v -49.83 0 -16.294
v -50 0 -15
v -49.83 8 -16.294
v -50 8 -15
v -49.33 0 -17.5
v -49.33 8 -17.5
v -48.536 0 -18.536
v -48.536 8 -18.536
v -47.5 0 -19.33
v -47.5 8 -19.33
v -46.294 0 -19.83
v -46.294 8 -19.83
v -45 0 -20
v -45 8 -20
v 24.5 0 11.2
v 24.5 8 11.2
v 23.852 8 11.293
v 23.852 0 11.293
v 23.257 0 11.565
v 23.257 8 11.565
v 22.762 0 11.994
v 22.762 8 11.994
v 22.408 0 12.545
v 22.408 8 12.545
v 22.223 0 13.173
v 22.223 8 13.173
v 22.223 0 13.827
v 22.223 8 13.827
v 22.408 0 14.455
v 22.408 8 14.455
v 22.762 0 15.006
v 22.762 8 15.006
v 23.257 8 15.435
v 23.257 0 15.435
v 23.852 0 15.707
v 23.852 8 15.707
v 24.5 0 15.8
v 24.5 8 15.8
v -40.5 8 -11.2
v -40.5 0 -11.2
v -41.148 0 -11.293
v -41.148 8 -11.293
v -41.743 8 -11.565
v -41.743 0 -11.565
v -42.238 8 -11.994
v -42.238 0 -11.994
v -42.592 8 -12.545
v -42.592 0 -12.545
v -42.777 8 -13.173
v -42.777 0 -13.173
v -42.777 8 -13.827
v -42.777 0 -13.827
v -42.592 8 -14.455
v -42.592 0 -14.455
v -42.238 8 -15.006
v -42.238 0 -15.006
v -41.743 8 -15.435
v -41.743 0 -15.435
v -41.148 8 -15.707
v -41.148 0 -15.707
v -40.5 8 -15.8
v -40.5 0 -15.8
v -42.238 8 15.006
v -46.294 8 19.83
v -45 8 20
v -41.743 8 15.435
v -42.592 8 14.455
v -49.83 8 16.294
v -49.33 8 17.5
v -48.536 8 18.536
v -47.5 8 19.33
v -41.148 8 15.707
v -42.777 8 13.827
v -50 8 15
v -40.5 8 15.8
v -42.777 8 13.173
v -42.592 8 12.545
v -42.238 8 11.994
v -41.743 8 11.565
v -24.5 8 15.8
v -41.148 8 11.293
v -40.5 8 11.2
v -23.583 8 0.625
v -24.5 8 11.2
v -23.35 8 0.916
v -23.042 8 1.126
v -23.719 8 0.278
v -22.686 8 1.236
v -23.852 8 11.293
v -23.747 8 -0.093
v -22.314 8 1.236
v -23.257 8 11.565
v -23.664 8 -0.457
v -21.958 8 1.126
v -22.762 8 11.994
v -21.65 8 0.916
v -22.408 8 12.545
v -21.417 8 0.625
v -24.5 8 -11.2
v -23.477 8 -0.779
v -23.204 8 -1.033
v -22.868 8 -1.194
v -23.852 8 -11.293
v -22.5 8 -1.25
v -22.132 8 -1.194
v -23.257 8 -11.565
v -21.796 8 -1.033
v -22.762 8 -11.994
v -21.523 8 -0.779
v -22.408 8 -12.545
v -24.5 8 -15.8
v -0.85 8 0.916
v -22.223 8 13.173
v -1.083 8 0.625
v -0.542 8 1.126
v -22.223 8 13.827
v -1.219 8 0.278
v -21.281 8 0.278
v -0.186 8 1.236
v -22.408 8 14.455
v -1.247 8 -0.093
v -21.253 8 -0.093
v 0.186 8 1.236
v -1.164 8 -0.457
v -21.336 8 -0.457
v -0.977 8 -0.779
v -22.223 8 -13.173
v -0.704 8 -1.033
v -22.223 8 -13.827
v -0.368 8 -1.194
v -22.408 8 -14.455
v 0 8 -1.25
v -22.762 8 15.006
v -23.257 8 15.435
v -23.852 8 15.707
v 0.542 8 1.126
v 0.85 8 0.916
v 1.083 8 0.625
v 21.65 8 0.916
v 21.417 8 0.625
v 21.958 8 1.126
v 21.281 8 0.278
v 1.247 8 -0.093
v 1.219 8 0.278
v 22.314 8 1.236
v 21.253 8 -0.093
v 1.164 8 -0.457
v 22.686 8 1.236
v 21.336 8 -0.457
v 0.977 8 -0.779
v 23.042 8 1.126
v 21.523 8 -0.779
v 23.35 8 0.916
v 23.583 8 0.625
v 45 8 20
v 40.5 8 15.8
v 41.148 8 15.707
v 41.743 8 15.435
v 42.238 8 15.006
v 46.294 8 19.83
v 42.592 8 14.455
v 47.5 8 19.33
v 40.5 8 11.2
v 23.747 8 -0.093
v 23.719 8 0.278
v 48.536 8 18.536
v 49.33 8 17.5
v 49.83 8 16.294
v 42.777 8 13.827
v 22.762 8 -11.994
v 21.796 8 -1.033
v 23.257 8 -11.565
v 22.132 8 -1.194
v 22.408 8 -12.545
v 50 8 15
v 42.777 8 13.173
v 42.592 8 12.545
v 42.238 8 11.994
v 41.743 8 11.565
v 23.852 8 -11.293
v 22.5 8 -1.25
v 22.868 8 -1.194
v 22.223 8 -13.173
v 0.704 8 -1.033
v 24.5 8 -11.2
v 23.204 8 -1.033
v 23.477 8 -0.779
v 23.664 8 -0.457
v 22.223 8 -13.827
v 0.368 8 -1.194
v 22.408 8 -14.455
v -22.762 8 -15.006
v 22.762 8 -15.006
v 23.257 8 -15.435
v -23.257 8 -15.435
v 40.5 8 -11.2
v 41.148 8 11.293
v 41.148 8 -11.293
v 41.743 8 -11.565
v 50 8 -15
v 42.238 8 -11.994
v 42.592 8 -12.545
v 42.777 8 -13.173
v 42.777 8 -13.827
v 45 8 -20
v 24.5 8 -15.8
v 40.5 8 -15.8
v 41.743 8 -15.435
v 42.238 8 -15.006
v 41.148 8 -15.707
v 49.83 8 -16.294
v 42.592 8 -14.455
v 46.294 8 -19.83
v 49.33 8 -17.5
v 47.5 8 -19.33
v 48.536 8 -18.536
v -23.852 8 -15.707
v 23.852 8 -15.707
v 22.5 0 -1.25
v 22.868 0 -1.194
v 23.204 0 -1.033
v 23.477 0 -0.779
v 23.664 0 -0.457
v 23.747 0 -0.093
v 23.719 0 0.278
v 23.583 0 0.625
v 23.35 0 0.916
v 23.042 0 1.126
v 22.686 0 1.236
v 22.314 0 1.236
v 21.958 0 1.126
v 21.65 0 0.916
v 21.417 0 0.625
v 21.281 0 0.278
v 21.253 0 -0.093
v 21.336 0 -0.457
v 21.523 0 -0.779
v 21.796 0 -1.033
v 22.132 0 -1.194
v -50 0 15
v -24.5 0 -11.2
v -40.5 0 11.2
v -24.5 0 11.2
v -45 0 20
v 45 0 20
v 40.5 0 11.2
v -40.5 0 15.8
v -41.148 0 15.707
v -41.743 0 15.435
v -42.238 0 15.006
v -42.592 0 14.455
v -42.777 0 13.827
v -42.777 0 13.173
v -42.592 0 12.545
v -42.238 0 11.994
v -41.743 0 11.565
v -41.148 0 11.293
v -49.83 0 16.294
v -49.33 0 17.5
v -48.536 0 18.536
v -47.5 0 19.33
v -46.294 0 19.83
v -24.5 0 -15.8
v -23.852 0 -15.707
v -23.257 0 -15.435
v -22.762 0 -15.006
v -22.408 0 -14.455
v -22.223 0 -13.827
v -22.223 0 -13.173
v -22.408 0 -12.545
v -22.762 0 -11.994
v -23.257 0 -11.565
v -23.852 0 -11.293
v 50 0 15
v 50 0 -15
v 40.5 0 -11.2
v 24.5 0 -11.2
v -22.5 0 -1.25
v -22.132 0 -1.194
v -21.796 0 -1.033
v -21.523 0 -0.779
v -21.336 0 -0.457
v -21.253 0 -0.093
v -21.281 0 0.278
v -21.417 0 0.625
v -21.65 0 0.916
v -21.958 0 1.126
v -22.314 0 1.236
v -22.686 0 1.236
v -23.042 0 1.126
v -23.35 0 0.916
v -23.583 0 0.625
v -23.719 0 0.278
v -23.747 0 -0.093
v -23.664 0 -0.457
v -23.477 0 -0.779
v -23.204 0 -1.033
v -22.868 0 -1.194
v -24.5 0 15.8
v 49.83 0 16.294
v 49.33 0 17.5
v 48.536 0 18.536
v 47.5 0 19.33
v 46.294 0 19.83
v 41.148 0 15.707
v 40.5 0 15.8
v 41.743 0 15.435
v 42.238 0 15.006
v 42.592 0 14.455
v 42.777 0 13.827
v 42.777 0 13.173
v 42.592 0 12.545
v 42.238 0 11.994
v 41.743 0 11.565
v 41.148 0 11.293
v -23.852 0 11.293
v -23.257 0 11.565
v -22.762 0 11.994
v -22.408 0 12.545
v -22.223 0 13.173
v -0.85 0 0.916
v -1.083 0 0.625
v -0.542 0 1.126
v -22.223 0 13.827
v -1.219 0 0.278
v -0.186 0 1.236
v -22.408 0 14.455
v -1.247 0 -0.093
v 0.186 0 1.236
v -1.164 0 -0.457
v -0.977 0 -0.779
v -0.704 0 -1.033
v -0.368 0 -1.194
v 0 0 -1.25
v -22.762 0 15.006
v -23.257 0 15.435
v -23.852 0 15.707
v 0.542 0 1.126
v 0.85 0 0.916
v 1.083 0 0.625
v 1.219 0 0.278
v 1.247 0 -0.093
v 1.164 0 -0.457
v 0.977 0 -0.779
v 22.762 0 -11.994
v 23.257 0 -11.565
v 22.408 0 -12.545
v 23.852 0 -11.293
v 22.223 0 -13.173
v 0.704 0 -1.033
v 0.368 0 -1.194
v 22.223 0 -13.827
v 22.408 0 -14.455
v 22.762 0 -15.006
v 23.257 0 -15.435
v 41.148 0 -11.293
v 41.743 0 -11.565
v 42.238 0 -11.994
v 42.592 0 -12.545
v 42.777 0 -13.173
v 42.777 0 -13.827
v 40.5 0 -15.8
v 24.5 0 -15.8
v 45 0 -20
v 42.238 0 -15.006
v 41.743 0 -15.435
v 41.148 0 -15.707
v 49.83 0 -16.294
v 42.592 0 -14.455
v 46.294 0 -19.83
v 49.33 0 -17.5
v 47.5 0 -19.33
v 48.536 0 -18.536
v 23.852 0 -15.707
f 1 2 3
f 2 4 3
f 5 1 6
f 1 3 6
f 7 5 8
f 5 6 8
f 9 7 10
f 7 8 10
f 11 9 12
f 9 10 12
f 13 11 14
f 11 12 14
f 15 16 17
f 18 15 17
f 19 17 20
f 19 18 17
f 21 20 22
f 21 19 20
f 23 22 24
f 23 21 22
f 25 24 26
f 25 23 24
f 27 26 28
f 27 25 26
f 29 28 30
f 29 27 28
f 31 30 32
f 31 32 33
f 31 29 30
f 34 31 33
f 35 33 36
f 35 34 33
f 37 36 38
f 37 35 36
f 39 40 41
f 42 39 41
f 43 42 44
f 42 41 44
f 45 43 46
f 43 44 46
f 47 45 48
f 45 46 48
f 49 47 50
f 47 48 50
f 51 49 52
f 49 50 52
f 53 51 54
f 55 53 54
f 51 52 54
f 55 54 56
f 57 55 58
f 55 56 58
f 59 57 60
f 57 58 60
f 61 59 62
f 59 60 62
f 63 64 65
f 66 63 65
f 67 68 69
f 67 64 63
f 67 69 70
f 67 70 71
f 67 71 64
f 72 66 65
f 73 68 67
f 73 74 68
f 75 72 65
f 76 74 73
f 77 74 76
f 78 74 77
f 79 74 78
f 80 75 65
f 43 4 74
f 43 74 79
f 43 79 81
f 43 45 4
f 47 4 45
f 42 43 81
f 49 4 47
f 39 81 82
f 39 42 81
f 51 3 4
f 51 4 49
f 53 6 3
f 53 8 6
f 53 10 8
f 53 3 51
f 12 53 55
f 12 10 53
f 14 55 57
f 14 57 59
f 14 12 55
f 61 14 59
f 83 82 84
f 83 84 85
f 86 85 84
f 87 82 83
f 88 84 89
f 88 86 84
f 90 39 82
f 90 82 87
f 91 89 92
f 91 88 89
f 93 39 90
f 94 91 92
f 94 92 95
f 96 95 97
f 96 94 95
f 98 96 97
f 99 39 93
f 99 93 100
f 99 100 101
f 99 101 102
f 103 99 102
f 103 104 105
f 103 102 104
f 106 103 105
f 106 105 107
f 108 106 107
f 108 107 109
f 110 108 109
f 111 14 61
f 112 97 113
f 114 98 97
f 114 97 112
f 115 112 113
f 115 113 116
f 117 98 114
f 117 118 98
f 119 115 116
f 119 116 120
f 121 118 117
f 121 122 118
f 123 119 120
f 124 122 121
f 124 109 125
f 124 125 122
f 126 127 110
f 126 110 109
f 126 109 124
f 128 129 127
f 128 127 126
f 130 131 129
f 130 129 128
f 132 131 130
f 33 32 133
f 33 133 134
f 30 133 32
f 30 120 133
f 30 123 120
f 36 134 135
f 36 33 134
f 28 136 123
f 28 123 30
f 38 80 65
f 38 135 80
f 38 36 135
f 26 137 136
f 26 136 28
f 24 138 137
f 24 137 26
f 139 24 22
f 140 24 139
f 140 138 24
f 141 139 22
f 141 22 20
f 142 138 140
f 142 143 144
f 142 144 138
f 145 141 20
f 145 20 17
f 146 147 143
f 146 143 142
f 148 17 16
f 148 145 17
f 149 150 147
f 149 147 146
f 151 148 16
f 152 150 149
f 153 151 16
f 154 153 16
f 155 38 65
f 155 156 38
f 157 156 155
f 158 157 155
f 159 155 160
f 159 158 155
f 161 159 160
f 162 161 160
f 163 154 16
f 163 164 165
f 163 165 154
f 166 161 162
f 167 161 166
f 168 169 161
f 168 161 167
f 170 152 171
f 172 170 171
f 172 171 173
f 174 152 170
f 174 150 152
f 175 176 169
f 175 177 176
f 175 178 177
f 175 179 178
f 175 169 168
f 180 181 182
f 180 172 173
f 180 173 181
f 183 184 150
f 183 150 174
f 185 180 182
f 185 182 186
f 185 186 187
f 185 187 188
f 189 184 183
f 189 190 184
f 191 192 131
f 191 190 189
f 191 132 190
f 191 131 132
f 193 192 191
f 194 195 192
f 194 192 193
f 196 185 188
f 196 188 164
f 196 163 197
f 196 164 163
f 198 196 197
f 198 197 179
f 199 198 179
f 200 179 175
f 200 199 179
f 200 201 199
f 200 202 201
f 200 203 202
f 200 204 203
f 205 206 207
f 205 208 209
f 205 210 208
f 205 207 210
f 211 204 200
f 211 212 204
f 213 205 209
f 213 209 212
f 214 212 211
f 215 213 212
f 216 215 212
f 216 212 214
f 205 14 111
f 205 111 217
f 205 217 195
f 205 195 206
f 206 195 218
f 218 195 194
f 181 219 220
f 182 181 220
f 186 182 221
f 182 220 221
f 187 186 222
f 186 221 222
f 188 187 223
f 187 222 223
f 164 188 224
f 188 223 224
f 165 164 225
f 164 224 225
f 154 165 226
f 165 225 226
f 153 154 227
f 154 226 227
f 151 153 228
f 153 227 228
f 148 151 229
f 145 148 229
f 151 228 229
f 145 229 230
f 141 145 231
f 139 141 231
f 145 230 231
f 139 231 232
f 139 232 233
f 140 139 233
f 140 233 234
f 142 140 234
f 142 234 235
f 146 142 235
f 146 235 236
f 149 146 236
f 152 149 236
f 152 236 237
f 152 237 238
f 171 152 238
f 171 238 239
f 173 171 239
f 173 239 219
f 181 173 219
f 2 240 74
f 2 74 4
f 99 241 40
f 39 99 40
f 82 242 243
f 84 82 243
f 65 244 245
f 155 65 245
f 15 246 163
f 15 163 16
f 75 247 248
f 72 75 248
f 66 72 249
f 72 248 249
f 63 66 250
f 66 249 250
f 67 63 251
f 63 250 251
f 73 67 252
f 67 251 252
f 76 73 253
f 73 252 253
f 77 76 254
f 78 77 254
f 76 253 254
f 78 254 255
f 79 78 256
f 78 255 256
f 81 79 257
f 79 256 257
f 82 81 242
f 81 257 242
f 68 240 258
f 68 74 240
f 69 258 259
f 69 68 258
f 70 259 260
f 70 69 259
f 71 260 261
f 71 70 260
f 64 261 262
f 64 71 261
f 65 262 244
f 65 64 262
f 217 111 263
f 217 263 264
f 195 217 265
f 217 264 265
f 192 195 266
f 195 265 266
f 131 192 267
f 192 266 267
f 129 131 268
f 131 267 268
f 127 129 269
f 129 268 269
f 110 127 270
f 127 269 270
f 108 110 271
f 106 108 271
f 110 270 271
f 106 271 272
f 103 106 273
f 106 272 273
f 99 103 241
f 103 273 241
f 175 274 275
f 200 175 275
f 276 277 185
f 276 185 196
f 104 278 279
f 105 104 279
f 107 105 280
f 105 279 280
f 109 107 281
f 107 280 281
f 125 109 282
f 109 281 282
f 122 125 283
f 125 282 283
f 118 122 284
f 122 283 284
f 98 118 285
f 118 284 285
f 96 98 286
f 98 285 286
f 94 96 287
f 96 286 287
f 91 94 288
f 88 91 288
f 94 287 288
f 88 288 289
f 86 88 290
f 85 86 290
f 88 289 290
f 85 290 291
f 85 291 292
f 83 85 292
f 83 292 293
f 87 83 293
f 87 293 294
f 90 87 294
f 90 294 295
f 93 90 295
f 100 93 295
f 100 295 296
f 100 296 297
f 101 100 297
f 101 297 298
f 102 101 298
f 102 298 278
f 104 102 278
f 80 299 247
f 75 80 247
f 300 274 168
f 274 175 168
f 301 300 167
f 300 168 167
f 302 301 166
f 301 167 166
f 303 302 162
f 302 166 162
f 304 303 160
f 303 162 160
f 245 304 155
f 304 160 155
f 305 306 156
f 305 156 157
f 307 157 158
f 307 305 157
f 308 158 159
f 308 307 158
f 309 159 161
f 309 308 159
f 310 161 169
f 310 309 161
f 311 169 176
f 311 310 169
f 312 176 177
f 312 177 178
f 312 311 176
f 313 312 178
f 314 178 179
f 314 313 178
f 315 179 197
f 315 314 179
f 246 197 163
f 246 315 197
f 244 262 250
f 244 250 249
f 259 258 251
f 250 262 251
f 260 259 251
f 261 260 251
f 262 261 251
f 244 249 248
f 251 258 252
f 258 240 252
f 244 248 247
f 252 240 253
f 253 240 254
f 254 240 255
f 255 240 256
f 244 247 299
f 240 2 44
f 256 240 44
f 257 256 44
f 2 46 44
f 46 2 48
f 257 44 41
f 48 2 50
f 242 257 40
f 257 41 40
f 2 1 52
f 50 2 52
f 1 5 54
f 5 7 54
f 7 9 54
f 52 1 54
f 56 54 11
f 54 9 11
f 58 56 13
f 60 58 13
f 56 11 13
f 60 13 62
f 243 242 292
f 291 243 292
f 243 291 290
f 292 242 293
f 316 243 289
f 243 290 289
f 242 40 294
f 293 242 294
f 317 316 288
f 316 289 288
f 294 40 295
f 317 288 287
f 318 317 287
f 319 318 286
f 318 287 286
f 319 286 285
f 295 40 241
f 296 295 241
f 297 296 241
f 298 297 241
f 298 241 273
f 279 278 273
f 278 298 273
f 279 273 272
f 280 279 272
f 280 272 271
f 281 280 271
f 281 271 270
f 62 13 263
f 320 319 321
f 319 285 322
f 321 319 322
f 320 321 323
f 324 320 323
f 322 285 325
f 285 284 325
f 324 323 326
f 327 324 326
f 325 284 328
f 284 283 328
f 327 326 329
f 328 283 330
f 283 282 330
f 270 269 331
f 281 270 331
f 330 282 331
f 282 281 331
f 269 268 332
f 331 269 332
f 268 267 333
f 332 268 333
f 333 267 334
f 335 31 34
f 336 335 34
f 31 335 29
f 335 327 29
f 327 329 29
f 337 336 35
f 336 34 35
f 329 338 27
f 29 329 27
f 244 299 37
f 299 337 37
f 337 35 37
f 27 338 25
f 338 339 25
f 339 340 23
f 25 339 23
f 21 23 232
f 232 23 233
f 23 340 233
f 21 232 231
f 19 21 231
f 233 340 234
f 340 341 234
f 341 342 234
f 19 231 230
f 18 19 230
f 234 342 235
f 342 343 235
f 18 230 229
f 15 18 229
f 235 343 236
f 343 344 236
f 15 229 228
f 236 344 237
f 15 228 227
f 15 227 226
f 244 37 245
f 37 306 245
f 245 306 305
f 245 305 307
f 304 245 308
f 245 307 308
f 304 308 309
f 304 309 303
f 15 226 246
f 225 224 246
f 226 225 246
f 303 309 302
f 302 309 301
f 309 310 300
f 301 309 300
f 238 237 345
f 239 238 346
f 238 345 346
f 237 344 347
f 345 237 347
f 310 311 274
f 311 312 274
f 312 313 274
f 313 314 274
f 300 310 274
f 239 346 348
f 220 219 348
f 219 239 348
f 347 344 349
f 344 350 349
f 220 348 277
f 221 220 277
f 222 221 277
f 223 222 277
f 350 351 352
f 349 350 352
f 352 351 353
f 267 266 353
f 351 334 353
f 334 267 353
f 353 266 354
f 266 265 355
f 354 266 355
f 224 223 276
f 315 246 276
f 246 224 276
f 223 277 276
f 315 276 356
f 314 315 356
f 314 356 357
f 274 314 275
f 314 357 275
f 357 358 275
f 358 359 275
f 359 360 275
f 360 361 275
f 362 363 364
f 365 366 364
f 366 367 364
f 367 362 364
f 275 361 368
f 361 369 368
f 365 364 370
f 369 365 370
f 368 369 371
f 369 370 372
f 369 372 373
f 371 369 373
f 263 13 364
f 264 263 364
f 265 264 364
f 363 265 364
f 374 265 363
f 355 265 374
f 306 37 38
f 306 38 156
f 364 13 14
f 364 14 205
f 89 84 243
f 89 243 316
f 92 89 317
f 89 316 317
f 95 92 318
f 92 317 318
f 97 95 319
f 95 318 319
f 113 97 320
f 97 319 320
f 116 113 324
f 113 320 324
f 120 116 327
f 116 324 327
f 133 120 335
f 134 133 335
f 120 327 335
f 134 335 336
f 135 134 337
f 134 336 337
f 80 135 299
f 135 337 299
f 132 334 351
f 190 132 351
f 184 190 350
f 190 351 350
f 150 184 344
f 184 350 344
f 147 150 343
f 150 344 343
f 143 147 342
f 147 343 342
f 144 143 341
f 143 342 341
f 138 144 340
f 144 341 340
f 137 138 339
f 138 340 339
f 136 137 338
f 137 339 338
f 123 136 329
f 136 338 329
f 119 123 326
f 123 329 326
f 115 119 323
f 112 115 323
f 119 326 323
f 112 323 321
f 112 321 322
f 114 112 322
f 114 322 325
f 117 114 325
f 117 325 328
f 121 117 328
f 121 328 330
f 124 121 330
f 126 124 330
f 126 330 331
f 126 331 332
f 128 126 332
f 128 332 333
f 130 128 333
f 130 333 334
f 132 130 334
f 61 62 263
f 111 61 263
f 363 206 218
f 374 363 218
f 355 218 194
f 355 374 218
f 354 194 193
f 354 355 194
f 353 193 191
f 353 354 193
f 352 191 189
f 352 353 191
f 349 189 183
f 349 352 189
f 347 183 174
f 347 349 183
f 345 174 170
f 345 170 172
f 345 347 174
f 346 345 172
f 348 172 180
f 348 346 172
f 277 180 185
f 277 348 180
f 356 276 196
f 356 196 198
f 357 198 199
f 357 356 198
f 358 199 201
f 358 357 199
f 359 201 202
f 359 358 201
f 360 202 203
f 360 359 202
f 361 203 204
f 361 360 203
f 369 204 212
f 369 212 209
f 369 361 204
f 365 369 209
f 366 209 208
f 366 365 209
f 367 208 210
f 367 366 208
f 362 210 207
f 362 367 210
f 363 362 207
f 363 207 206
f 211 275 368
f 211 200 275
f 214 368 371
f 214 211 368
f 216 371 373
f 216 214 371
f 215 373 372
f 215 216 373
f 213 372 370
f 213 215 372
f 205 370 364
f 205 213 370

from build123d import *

# Parameters (mm, degrees)
SKETCH_1_W                       = 100
SKETCH_1_H                       = 40
EXTRUDE_1_DEPTH                  = 8
HOLE_WIZARD_M3_2_D               = 2.5
HOLE_WIZARD_M3_2_DEPTH           = 21.5
HOLE_WIZARD_M3_2_TIP             = 0.751075774
HOLE_WIZARD_M3_2_ON_FACE_2_D     = 2.5
HOLE_WIZARD_M3_2_ON_FACE_2_DEPTH = 21.5
HOLE_WIZARD_M3_2_ON_FACE_2_TIP   = 0.751075774
FILLET_1_R                       = 5


with BuildPart() as part:
    # 草图1 → 凸台-拉伸1 (new body)
    with BuildSketch(Plane(origin=(0, 0, 0), x_dir=(1, 0, 0), z_dir=(0, 1, 0))):
        Rectangle(SKETCH_1_W, SKETCH_1_H)
        with BuildLine():
            Line((-40.5, 15.8), (-24.5, 15.8))
            ThreePointArc((-24.5, 15.8), (-22.2, 13.5), (-24.5, 11.2))
            Line((-24.5, 11.2), (-40.5, 11.2))
            ThreePointArc((-40.5, 11.2), (-42.8, 13.5), (-40.5, 15.8))
        make_face(mode=Mode.SUBTRACT)
        with BuildLine():
            Line((-40.5, -11.2), (-24.5, -11.2))
            ThreePointArc((-24.5, -11.2), (-22.2, -13.5), (-24.5, -15.8))
            Line((-24.5, -15.8), (-40.5, -15.8))
            ThreePointArc((-40.5, -15.8), (-42.8, -13.5), (-40.5, -11.2))
        make_face(mode=Mode.SUBTRACT)
        with BuildLine():
            Line((40.5, 15.8), (24.5, 15.8))
            ThreePointArc((24.5, 15.8), (22.2, 13.5), (24.5, 11.2))
            Line((24.5, 11.2), (40.5, 11.2))
            ThreePointArc((40.5, 11.2), (42.8, 13.5), (40.5, 15.8))
        make_face(mode=Mode.SUBTRACT)
        with BuildLine():
            Line((40.5, -11.2), (24.5, -11.2))
            ThreePointArc((24.5, -11.2), (22.2, -13.5), (24.5, -15.8))
            Line((24.5, -15.8), (40.5, -15.8))
            ThreePointArc((40.5, -15.8), (42.8, -13.5), (40.5, -11.2))
        make_face(mode=Mode.SUBTRACT)
    extrude(amount=EXTRUDE_1_DEPTH)

    # M3 螺纹孔2
    with Locations(Plane(origin=(-22.5, 8, 0), x_dir=(0, 0, 1), z_dir=(0, 1, 0))):
        with Locations((0, 0), (0, 45), (0, 22.5)):
            Hole(HOLE_WIZARD_M3_2_D / 2, depth=HOLE_WIZARD_M3_2_DEPTH)
            with Locations((0, 0, -(HOLE_WIZARD_M3_2_DEPTH + HOLE_WIZARD_M3_2_TIP / 2))):  # 118° drill point
                Cone(0, HOLE_WIZARD_M3_2_D / 2, HOLE_WIZARD_M3_2_TIP, mode=Mode.SUBTRACT)

    # M3 螺纹孔2 on face 2
    with Locations(Plane(origin=(0, 0, 0), x_dir=(0, 0, -1), z_dir=(0, -1, 0))):
        with Locations((0, 0)):
            Hole(HOLE_WIZARD_M3_2_ON_FACE_2_D / 2, depth=HOLE_WIZARD_M3_2_ON_FACE_2_DEPTH)
            with Locations((0, 0, -(HOLE_WIZARD_M3_2_ON_FACE_2_DEPTH + HOLE_WIZARD_M3_2_ON_FACE_2_TIP / 2))):  # 118° drill point
                Cone(0, HOLE_WIZARD_M3_2_ON_FACE_2_D / 2, HOLE_WIZARD_M3_2_ON_FACE_2_TIP, mode=Mode.SUBTRACT)

    # 圆角1
    fillet_1_edges = [part.edges().sort_by_distance(p)[0] for p in [
        (50, 4, 20),
        (-50, 4, 20),
        (-50, 4, -20),
        (50, 4, -20),
    ]]
    fillet(fillet_1_edges, radius=FILLET_1_R)


solid = part.part
